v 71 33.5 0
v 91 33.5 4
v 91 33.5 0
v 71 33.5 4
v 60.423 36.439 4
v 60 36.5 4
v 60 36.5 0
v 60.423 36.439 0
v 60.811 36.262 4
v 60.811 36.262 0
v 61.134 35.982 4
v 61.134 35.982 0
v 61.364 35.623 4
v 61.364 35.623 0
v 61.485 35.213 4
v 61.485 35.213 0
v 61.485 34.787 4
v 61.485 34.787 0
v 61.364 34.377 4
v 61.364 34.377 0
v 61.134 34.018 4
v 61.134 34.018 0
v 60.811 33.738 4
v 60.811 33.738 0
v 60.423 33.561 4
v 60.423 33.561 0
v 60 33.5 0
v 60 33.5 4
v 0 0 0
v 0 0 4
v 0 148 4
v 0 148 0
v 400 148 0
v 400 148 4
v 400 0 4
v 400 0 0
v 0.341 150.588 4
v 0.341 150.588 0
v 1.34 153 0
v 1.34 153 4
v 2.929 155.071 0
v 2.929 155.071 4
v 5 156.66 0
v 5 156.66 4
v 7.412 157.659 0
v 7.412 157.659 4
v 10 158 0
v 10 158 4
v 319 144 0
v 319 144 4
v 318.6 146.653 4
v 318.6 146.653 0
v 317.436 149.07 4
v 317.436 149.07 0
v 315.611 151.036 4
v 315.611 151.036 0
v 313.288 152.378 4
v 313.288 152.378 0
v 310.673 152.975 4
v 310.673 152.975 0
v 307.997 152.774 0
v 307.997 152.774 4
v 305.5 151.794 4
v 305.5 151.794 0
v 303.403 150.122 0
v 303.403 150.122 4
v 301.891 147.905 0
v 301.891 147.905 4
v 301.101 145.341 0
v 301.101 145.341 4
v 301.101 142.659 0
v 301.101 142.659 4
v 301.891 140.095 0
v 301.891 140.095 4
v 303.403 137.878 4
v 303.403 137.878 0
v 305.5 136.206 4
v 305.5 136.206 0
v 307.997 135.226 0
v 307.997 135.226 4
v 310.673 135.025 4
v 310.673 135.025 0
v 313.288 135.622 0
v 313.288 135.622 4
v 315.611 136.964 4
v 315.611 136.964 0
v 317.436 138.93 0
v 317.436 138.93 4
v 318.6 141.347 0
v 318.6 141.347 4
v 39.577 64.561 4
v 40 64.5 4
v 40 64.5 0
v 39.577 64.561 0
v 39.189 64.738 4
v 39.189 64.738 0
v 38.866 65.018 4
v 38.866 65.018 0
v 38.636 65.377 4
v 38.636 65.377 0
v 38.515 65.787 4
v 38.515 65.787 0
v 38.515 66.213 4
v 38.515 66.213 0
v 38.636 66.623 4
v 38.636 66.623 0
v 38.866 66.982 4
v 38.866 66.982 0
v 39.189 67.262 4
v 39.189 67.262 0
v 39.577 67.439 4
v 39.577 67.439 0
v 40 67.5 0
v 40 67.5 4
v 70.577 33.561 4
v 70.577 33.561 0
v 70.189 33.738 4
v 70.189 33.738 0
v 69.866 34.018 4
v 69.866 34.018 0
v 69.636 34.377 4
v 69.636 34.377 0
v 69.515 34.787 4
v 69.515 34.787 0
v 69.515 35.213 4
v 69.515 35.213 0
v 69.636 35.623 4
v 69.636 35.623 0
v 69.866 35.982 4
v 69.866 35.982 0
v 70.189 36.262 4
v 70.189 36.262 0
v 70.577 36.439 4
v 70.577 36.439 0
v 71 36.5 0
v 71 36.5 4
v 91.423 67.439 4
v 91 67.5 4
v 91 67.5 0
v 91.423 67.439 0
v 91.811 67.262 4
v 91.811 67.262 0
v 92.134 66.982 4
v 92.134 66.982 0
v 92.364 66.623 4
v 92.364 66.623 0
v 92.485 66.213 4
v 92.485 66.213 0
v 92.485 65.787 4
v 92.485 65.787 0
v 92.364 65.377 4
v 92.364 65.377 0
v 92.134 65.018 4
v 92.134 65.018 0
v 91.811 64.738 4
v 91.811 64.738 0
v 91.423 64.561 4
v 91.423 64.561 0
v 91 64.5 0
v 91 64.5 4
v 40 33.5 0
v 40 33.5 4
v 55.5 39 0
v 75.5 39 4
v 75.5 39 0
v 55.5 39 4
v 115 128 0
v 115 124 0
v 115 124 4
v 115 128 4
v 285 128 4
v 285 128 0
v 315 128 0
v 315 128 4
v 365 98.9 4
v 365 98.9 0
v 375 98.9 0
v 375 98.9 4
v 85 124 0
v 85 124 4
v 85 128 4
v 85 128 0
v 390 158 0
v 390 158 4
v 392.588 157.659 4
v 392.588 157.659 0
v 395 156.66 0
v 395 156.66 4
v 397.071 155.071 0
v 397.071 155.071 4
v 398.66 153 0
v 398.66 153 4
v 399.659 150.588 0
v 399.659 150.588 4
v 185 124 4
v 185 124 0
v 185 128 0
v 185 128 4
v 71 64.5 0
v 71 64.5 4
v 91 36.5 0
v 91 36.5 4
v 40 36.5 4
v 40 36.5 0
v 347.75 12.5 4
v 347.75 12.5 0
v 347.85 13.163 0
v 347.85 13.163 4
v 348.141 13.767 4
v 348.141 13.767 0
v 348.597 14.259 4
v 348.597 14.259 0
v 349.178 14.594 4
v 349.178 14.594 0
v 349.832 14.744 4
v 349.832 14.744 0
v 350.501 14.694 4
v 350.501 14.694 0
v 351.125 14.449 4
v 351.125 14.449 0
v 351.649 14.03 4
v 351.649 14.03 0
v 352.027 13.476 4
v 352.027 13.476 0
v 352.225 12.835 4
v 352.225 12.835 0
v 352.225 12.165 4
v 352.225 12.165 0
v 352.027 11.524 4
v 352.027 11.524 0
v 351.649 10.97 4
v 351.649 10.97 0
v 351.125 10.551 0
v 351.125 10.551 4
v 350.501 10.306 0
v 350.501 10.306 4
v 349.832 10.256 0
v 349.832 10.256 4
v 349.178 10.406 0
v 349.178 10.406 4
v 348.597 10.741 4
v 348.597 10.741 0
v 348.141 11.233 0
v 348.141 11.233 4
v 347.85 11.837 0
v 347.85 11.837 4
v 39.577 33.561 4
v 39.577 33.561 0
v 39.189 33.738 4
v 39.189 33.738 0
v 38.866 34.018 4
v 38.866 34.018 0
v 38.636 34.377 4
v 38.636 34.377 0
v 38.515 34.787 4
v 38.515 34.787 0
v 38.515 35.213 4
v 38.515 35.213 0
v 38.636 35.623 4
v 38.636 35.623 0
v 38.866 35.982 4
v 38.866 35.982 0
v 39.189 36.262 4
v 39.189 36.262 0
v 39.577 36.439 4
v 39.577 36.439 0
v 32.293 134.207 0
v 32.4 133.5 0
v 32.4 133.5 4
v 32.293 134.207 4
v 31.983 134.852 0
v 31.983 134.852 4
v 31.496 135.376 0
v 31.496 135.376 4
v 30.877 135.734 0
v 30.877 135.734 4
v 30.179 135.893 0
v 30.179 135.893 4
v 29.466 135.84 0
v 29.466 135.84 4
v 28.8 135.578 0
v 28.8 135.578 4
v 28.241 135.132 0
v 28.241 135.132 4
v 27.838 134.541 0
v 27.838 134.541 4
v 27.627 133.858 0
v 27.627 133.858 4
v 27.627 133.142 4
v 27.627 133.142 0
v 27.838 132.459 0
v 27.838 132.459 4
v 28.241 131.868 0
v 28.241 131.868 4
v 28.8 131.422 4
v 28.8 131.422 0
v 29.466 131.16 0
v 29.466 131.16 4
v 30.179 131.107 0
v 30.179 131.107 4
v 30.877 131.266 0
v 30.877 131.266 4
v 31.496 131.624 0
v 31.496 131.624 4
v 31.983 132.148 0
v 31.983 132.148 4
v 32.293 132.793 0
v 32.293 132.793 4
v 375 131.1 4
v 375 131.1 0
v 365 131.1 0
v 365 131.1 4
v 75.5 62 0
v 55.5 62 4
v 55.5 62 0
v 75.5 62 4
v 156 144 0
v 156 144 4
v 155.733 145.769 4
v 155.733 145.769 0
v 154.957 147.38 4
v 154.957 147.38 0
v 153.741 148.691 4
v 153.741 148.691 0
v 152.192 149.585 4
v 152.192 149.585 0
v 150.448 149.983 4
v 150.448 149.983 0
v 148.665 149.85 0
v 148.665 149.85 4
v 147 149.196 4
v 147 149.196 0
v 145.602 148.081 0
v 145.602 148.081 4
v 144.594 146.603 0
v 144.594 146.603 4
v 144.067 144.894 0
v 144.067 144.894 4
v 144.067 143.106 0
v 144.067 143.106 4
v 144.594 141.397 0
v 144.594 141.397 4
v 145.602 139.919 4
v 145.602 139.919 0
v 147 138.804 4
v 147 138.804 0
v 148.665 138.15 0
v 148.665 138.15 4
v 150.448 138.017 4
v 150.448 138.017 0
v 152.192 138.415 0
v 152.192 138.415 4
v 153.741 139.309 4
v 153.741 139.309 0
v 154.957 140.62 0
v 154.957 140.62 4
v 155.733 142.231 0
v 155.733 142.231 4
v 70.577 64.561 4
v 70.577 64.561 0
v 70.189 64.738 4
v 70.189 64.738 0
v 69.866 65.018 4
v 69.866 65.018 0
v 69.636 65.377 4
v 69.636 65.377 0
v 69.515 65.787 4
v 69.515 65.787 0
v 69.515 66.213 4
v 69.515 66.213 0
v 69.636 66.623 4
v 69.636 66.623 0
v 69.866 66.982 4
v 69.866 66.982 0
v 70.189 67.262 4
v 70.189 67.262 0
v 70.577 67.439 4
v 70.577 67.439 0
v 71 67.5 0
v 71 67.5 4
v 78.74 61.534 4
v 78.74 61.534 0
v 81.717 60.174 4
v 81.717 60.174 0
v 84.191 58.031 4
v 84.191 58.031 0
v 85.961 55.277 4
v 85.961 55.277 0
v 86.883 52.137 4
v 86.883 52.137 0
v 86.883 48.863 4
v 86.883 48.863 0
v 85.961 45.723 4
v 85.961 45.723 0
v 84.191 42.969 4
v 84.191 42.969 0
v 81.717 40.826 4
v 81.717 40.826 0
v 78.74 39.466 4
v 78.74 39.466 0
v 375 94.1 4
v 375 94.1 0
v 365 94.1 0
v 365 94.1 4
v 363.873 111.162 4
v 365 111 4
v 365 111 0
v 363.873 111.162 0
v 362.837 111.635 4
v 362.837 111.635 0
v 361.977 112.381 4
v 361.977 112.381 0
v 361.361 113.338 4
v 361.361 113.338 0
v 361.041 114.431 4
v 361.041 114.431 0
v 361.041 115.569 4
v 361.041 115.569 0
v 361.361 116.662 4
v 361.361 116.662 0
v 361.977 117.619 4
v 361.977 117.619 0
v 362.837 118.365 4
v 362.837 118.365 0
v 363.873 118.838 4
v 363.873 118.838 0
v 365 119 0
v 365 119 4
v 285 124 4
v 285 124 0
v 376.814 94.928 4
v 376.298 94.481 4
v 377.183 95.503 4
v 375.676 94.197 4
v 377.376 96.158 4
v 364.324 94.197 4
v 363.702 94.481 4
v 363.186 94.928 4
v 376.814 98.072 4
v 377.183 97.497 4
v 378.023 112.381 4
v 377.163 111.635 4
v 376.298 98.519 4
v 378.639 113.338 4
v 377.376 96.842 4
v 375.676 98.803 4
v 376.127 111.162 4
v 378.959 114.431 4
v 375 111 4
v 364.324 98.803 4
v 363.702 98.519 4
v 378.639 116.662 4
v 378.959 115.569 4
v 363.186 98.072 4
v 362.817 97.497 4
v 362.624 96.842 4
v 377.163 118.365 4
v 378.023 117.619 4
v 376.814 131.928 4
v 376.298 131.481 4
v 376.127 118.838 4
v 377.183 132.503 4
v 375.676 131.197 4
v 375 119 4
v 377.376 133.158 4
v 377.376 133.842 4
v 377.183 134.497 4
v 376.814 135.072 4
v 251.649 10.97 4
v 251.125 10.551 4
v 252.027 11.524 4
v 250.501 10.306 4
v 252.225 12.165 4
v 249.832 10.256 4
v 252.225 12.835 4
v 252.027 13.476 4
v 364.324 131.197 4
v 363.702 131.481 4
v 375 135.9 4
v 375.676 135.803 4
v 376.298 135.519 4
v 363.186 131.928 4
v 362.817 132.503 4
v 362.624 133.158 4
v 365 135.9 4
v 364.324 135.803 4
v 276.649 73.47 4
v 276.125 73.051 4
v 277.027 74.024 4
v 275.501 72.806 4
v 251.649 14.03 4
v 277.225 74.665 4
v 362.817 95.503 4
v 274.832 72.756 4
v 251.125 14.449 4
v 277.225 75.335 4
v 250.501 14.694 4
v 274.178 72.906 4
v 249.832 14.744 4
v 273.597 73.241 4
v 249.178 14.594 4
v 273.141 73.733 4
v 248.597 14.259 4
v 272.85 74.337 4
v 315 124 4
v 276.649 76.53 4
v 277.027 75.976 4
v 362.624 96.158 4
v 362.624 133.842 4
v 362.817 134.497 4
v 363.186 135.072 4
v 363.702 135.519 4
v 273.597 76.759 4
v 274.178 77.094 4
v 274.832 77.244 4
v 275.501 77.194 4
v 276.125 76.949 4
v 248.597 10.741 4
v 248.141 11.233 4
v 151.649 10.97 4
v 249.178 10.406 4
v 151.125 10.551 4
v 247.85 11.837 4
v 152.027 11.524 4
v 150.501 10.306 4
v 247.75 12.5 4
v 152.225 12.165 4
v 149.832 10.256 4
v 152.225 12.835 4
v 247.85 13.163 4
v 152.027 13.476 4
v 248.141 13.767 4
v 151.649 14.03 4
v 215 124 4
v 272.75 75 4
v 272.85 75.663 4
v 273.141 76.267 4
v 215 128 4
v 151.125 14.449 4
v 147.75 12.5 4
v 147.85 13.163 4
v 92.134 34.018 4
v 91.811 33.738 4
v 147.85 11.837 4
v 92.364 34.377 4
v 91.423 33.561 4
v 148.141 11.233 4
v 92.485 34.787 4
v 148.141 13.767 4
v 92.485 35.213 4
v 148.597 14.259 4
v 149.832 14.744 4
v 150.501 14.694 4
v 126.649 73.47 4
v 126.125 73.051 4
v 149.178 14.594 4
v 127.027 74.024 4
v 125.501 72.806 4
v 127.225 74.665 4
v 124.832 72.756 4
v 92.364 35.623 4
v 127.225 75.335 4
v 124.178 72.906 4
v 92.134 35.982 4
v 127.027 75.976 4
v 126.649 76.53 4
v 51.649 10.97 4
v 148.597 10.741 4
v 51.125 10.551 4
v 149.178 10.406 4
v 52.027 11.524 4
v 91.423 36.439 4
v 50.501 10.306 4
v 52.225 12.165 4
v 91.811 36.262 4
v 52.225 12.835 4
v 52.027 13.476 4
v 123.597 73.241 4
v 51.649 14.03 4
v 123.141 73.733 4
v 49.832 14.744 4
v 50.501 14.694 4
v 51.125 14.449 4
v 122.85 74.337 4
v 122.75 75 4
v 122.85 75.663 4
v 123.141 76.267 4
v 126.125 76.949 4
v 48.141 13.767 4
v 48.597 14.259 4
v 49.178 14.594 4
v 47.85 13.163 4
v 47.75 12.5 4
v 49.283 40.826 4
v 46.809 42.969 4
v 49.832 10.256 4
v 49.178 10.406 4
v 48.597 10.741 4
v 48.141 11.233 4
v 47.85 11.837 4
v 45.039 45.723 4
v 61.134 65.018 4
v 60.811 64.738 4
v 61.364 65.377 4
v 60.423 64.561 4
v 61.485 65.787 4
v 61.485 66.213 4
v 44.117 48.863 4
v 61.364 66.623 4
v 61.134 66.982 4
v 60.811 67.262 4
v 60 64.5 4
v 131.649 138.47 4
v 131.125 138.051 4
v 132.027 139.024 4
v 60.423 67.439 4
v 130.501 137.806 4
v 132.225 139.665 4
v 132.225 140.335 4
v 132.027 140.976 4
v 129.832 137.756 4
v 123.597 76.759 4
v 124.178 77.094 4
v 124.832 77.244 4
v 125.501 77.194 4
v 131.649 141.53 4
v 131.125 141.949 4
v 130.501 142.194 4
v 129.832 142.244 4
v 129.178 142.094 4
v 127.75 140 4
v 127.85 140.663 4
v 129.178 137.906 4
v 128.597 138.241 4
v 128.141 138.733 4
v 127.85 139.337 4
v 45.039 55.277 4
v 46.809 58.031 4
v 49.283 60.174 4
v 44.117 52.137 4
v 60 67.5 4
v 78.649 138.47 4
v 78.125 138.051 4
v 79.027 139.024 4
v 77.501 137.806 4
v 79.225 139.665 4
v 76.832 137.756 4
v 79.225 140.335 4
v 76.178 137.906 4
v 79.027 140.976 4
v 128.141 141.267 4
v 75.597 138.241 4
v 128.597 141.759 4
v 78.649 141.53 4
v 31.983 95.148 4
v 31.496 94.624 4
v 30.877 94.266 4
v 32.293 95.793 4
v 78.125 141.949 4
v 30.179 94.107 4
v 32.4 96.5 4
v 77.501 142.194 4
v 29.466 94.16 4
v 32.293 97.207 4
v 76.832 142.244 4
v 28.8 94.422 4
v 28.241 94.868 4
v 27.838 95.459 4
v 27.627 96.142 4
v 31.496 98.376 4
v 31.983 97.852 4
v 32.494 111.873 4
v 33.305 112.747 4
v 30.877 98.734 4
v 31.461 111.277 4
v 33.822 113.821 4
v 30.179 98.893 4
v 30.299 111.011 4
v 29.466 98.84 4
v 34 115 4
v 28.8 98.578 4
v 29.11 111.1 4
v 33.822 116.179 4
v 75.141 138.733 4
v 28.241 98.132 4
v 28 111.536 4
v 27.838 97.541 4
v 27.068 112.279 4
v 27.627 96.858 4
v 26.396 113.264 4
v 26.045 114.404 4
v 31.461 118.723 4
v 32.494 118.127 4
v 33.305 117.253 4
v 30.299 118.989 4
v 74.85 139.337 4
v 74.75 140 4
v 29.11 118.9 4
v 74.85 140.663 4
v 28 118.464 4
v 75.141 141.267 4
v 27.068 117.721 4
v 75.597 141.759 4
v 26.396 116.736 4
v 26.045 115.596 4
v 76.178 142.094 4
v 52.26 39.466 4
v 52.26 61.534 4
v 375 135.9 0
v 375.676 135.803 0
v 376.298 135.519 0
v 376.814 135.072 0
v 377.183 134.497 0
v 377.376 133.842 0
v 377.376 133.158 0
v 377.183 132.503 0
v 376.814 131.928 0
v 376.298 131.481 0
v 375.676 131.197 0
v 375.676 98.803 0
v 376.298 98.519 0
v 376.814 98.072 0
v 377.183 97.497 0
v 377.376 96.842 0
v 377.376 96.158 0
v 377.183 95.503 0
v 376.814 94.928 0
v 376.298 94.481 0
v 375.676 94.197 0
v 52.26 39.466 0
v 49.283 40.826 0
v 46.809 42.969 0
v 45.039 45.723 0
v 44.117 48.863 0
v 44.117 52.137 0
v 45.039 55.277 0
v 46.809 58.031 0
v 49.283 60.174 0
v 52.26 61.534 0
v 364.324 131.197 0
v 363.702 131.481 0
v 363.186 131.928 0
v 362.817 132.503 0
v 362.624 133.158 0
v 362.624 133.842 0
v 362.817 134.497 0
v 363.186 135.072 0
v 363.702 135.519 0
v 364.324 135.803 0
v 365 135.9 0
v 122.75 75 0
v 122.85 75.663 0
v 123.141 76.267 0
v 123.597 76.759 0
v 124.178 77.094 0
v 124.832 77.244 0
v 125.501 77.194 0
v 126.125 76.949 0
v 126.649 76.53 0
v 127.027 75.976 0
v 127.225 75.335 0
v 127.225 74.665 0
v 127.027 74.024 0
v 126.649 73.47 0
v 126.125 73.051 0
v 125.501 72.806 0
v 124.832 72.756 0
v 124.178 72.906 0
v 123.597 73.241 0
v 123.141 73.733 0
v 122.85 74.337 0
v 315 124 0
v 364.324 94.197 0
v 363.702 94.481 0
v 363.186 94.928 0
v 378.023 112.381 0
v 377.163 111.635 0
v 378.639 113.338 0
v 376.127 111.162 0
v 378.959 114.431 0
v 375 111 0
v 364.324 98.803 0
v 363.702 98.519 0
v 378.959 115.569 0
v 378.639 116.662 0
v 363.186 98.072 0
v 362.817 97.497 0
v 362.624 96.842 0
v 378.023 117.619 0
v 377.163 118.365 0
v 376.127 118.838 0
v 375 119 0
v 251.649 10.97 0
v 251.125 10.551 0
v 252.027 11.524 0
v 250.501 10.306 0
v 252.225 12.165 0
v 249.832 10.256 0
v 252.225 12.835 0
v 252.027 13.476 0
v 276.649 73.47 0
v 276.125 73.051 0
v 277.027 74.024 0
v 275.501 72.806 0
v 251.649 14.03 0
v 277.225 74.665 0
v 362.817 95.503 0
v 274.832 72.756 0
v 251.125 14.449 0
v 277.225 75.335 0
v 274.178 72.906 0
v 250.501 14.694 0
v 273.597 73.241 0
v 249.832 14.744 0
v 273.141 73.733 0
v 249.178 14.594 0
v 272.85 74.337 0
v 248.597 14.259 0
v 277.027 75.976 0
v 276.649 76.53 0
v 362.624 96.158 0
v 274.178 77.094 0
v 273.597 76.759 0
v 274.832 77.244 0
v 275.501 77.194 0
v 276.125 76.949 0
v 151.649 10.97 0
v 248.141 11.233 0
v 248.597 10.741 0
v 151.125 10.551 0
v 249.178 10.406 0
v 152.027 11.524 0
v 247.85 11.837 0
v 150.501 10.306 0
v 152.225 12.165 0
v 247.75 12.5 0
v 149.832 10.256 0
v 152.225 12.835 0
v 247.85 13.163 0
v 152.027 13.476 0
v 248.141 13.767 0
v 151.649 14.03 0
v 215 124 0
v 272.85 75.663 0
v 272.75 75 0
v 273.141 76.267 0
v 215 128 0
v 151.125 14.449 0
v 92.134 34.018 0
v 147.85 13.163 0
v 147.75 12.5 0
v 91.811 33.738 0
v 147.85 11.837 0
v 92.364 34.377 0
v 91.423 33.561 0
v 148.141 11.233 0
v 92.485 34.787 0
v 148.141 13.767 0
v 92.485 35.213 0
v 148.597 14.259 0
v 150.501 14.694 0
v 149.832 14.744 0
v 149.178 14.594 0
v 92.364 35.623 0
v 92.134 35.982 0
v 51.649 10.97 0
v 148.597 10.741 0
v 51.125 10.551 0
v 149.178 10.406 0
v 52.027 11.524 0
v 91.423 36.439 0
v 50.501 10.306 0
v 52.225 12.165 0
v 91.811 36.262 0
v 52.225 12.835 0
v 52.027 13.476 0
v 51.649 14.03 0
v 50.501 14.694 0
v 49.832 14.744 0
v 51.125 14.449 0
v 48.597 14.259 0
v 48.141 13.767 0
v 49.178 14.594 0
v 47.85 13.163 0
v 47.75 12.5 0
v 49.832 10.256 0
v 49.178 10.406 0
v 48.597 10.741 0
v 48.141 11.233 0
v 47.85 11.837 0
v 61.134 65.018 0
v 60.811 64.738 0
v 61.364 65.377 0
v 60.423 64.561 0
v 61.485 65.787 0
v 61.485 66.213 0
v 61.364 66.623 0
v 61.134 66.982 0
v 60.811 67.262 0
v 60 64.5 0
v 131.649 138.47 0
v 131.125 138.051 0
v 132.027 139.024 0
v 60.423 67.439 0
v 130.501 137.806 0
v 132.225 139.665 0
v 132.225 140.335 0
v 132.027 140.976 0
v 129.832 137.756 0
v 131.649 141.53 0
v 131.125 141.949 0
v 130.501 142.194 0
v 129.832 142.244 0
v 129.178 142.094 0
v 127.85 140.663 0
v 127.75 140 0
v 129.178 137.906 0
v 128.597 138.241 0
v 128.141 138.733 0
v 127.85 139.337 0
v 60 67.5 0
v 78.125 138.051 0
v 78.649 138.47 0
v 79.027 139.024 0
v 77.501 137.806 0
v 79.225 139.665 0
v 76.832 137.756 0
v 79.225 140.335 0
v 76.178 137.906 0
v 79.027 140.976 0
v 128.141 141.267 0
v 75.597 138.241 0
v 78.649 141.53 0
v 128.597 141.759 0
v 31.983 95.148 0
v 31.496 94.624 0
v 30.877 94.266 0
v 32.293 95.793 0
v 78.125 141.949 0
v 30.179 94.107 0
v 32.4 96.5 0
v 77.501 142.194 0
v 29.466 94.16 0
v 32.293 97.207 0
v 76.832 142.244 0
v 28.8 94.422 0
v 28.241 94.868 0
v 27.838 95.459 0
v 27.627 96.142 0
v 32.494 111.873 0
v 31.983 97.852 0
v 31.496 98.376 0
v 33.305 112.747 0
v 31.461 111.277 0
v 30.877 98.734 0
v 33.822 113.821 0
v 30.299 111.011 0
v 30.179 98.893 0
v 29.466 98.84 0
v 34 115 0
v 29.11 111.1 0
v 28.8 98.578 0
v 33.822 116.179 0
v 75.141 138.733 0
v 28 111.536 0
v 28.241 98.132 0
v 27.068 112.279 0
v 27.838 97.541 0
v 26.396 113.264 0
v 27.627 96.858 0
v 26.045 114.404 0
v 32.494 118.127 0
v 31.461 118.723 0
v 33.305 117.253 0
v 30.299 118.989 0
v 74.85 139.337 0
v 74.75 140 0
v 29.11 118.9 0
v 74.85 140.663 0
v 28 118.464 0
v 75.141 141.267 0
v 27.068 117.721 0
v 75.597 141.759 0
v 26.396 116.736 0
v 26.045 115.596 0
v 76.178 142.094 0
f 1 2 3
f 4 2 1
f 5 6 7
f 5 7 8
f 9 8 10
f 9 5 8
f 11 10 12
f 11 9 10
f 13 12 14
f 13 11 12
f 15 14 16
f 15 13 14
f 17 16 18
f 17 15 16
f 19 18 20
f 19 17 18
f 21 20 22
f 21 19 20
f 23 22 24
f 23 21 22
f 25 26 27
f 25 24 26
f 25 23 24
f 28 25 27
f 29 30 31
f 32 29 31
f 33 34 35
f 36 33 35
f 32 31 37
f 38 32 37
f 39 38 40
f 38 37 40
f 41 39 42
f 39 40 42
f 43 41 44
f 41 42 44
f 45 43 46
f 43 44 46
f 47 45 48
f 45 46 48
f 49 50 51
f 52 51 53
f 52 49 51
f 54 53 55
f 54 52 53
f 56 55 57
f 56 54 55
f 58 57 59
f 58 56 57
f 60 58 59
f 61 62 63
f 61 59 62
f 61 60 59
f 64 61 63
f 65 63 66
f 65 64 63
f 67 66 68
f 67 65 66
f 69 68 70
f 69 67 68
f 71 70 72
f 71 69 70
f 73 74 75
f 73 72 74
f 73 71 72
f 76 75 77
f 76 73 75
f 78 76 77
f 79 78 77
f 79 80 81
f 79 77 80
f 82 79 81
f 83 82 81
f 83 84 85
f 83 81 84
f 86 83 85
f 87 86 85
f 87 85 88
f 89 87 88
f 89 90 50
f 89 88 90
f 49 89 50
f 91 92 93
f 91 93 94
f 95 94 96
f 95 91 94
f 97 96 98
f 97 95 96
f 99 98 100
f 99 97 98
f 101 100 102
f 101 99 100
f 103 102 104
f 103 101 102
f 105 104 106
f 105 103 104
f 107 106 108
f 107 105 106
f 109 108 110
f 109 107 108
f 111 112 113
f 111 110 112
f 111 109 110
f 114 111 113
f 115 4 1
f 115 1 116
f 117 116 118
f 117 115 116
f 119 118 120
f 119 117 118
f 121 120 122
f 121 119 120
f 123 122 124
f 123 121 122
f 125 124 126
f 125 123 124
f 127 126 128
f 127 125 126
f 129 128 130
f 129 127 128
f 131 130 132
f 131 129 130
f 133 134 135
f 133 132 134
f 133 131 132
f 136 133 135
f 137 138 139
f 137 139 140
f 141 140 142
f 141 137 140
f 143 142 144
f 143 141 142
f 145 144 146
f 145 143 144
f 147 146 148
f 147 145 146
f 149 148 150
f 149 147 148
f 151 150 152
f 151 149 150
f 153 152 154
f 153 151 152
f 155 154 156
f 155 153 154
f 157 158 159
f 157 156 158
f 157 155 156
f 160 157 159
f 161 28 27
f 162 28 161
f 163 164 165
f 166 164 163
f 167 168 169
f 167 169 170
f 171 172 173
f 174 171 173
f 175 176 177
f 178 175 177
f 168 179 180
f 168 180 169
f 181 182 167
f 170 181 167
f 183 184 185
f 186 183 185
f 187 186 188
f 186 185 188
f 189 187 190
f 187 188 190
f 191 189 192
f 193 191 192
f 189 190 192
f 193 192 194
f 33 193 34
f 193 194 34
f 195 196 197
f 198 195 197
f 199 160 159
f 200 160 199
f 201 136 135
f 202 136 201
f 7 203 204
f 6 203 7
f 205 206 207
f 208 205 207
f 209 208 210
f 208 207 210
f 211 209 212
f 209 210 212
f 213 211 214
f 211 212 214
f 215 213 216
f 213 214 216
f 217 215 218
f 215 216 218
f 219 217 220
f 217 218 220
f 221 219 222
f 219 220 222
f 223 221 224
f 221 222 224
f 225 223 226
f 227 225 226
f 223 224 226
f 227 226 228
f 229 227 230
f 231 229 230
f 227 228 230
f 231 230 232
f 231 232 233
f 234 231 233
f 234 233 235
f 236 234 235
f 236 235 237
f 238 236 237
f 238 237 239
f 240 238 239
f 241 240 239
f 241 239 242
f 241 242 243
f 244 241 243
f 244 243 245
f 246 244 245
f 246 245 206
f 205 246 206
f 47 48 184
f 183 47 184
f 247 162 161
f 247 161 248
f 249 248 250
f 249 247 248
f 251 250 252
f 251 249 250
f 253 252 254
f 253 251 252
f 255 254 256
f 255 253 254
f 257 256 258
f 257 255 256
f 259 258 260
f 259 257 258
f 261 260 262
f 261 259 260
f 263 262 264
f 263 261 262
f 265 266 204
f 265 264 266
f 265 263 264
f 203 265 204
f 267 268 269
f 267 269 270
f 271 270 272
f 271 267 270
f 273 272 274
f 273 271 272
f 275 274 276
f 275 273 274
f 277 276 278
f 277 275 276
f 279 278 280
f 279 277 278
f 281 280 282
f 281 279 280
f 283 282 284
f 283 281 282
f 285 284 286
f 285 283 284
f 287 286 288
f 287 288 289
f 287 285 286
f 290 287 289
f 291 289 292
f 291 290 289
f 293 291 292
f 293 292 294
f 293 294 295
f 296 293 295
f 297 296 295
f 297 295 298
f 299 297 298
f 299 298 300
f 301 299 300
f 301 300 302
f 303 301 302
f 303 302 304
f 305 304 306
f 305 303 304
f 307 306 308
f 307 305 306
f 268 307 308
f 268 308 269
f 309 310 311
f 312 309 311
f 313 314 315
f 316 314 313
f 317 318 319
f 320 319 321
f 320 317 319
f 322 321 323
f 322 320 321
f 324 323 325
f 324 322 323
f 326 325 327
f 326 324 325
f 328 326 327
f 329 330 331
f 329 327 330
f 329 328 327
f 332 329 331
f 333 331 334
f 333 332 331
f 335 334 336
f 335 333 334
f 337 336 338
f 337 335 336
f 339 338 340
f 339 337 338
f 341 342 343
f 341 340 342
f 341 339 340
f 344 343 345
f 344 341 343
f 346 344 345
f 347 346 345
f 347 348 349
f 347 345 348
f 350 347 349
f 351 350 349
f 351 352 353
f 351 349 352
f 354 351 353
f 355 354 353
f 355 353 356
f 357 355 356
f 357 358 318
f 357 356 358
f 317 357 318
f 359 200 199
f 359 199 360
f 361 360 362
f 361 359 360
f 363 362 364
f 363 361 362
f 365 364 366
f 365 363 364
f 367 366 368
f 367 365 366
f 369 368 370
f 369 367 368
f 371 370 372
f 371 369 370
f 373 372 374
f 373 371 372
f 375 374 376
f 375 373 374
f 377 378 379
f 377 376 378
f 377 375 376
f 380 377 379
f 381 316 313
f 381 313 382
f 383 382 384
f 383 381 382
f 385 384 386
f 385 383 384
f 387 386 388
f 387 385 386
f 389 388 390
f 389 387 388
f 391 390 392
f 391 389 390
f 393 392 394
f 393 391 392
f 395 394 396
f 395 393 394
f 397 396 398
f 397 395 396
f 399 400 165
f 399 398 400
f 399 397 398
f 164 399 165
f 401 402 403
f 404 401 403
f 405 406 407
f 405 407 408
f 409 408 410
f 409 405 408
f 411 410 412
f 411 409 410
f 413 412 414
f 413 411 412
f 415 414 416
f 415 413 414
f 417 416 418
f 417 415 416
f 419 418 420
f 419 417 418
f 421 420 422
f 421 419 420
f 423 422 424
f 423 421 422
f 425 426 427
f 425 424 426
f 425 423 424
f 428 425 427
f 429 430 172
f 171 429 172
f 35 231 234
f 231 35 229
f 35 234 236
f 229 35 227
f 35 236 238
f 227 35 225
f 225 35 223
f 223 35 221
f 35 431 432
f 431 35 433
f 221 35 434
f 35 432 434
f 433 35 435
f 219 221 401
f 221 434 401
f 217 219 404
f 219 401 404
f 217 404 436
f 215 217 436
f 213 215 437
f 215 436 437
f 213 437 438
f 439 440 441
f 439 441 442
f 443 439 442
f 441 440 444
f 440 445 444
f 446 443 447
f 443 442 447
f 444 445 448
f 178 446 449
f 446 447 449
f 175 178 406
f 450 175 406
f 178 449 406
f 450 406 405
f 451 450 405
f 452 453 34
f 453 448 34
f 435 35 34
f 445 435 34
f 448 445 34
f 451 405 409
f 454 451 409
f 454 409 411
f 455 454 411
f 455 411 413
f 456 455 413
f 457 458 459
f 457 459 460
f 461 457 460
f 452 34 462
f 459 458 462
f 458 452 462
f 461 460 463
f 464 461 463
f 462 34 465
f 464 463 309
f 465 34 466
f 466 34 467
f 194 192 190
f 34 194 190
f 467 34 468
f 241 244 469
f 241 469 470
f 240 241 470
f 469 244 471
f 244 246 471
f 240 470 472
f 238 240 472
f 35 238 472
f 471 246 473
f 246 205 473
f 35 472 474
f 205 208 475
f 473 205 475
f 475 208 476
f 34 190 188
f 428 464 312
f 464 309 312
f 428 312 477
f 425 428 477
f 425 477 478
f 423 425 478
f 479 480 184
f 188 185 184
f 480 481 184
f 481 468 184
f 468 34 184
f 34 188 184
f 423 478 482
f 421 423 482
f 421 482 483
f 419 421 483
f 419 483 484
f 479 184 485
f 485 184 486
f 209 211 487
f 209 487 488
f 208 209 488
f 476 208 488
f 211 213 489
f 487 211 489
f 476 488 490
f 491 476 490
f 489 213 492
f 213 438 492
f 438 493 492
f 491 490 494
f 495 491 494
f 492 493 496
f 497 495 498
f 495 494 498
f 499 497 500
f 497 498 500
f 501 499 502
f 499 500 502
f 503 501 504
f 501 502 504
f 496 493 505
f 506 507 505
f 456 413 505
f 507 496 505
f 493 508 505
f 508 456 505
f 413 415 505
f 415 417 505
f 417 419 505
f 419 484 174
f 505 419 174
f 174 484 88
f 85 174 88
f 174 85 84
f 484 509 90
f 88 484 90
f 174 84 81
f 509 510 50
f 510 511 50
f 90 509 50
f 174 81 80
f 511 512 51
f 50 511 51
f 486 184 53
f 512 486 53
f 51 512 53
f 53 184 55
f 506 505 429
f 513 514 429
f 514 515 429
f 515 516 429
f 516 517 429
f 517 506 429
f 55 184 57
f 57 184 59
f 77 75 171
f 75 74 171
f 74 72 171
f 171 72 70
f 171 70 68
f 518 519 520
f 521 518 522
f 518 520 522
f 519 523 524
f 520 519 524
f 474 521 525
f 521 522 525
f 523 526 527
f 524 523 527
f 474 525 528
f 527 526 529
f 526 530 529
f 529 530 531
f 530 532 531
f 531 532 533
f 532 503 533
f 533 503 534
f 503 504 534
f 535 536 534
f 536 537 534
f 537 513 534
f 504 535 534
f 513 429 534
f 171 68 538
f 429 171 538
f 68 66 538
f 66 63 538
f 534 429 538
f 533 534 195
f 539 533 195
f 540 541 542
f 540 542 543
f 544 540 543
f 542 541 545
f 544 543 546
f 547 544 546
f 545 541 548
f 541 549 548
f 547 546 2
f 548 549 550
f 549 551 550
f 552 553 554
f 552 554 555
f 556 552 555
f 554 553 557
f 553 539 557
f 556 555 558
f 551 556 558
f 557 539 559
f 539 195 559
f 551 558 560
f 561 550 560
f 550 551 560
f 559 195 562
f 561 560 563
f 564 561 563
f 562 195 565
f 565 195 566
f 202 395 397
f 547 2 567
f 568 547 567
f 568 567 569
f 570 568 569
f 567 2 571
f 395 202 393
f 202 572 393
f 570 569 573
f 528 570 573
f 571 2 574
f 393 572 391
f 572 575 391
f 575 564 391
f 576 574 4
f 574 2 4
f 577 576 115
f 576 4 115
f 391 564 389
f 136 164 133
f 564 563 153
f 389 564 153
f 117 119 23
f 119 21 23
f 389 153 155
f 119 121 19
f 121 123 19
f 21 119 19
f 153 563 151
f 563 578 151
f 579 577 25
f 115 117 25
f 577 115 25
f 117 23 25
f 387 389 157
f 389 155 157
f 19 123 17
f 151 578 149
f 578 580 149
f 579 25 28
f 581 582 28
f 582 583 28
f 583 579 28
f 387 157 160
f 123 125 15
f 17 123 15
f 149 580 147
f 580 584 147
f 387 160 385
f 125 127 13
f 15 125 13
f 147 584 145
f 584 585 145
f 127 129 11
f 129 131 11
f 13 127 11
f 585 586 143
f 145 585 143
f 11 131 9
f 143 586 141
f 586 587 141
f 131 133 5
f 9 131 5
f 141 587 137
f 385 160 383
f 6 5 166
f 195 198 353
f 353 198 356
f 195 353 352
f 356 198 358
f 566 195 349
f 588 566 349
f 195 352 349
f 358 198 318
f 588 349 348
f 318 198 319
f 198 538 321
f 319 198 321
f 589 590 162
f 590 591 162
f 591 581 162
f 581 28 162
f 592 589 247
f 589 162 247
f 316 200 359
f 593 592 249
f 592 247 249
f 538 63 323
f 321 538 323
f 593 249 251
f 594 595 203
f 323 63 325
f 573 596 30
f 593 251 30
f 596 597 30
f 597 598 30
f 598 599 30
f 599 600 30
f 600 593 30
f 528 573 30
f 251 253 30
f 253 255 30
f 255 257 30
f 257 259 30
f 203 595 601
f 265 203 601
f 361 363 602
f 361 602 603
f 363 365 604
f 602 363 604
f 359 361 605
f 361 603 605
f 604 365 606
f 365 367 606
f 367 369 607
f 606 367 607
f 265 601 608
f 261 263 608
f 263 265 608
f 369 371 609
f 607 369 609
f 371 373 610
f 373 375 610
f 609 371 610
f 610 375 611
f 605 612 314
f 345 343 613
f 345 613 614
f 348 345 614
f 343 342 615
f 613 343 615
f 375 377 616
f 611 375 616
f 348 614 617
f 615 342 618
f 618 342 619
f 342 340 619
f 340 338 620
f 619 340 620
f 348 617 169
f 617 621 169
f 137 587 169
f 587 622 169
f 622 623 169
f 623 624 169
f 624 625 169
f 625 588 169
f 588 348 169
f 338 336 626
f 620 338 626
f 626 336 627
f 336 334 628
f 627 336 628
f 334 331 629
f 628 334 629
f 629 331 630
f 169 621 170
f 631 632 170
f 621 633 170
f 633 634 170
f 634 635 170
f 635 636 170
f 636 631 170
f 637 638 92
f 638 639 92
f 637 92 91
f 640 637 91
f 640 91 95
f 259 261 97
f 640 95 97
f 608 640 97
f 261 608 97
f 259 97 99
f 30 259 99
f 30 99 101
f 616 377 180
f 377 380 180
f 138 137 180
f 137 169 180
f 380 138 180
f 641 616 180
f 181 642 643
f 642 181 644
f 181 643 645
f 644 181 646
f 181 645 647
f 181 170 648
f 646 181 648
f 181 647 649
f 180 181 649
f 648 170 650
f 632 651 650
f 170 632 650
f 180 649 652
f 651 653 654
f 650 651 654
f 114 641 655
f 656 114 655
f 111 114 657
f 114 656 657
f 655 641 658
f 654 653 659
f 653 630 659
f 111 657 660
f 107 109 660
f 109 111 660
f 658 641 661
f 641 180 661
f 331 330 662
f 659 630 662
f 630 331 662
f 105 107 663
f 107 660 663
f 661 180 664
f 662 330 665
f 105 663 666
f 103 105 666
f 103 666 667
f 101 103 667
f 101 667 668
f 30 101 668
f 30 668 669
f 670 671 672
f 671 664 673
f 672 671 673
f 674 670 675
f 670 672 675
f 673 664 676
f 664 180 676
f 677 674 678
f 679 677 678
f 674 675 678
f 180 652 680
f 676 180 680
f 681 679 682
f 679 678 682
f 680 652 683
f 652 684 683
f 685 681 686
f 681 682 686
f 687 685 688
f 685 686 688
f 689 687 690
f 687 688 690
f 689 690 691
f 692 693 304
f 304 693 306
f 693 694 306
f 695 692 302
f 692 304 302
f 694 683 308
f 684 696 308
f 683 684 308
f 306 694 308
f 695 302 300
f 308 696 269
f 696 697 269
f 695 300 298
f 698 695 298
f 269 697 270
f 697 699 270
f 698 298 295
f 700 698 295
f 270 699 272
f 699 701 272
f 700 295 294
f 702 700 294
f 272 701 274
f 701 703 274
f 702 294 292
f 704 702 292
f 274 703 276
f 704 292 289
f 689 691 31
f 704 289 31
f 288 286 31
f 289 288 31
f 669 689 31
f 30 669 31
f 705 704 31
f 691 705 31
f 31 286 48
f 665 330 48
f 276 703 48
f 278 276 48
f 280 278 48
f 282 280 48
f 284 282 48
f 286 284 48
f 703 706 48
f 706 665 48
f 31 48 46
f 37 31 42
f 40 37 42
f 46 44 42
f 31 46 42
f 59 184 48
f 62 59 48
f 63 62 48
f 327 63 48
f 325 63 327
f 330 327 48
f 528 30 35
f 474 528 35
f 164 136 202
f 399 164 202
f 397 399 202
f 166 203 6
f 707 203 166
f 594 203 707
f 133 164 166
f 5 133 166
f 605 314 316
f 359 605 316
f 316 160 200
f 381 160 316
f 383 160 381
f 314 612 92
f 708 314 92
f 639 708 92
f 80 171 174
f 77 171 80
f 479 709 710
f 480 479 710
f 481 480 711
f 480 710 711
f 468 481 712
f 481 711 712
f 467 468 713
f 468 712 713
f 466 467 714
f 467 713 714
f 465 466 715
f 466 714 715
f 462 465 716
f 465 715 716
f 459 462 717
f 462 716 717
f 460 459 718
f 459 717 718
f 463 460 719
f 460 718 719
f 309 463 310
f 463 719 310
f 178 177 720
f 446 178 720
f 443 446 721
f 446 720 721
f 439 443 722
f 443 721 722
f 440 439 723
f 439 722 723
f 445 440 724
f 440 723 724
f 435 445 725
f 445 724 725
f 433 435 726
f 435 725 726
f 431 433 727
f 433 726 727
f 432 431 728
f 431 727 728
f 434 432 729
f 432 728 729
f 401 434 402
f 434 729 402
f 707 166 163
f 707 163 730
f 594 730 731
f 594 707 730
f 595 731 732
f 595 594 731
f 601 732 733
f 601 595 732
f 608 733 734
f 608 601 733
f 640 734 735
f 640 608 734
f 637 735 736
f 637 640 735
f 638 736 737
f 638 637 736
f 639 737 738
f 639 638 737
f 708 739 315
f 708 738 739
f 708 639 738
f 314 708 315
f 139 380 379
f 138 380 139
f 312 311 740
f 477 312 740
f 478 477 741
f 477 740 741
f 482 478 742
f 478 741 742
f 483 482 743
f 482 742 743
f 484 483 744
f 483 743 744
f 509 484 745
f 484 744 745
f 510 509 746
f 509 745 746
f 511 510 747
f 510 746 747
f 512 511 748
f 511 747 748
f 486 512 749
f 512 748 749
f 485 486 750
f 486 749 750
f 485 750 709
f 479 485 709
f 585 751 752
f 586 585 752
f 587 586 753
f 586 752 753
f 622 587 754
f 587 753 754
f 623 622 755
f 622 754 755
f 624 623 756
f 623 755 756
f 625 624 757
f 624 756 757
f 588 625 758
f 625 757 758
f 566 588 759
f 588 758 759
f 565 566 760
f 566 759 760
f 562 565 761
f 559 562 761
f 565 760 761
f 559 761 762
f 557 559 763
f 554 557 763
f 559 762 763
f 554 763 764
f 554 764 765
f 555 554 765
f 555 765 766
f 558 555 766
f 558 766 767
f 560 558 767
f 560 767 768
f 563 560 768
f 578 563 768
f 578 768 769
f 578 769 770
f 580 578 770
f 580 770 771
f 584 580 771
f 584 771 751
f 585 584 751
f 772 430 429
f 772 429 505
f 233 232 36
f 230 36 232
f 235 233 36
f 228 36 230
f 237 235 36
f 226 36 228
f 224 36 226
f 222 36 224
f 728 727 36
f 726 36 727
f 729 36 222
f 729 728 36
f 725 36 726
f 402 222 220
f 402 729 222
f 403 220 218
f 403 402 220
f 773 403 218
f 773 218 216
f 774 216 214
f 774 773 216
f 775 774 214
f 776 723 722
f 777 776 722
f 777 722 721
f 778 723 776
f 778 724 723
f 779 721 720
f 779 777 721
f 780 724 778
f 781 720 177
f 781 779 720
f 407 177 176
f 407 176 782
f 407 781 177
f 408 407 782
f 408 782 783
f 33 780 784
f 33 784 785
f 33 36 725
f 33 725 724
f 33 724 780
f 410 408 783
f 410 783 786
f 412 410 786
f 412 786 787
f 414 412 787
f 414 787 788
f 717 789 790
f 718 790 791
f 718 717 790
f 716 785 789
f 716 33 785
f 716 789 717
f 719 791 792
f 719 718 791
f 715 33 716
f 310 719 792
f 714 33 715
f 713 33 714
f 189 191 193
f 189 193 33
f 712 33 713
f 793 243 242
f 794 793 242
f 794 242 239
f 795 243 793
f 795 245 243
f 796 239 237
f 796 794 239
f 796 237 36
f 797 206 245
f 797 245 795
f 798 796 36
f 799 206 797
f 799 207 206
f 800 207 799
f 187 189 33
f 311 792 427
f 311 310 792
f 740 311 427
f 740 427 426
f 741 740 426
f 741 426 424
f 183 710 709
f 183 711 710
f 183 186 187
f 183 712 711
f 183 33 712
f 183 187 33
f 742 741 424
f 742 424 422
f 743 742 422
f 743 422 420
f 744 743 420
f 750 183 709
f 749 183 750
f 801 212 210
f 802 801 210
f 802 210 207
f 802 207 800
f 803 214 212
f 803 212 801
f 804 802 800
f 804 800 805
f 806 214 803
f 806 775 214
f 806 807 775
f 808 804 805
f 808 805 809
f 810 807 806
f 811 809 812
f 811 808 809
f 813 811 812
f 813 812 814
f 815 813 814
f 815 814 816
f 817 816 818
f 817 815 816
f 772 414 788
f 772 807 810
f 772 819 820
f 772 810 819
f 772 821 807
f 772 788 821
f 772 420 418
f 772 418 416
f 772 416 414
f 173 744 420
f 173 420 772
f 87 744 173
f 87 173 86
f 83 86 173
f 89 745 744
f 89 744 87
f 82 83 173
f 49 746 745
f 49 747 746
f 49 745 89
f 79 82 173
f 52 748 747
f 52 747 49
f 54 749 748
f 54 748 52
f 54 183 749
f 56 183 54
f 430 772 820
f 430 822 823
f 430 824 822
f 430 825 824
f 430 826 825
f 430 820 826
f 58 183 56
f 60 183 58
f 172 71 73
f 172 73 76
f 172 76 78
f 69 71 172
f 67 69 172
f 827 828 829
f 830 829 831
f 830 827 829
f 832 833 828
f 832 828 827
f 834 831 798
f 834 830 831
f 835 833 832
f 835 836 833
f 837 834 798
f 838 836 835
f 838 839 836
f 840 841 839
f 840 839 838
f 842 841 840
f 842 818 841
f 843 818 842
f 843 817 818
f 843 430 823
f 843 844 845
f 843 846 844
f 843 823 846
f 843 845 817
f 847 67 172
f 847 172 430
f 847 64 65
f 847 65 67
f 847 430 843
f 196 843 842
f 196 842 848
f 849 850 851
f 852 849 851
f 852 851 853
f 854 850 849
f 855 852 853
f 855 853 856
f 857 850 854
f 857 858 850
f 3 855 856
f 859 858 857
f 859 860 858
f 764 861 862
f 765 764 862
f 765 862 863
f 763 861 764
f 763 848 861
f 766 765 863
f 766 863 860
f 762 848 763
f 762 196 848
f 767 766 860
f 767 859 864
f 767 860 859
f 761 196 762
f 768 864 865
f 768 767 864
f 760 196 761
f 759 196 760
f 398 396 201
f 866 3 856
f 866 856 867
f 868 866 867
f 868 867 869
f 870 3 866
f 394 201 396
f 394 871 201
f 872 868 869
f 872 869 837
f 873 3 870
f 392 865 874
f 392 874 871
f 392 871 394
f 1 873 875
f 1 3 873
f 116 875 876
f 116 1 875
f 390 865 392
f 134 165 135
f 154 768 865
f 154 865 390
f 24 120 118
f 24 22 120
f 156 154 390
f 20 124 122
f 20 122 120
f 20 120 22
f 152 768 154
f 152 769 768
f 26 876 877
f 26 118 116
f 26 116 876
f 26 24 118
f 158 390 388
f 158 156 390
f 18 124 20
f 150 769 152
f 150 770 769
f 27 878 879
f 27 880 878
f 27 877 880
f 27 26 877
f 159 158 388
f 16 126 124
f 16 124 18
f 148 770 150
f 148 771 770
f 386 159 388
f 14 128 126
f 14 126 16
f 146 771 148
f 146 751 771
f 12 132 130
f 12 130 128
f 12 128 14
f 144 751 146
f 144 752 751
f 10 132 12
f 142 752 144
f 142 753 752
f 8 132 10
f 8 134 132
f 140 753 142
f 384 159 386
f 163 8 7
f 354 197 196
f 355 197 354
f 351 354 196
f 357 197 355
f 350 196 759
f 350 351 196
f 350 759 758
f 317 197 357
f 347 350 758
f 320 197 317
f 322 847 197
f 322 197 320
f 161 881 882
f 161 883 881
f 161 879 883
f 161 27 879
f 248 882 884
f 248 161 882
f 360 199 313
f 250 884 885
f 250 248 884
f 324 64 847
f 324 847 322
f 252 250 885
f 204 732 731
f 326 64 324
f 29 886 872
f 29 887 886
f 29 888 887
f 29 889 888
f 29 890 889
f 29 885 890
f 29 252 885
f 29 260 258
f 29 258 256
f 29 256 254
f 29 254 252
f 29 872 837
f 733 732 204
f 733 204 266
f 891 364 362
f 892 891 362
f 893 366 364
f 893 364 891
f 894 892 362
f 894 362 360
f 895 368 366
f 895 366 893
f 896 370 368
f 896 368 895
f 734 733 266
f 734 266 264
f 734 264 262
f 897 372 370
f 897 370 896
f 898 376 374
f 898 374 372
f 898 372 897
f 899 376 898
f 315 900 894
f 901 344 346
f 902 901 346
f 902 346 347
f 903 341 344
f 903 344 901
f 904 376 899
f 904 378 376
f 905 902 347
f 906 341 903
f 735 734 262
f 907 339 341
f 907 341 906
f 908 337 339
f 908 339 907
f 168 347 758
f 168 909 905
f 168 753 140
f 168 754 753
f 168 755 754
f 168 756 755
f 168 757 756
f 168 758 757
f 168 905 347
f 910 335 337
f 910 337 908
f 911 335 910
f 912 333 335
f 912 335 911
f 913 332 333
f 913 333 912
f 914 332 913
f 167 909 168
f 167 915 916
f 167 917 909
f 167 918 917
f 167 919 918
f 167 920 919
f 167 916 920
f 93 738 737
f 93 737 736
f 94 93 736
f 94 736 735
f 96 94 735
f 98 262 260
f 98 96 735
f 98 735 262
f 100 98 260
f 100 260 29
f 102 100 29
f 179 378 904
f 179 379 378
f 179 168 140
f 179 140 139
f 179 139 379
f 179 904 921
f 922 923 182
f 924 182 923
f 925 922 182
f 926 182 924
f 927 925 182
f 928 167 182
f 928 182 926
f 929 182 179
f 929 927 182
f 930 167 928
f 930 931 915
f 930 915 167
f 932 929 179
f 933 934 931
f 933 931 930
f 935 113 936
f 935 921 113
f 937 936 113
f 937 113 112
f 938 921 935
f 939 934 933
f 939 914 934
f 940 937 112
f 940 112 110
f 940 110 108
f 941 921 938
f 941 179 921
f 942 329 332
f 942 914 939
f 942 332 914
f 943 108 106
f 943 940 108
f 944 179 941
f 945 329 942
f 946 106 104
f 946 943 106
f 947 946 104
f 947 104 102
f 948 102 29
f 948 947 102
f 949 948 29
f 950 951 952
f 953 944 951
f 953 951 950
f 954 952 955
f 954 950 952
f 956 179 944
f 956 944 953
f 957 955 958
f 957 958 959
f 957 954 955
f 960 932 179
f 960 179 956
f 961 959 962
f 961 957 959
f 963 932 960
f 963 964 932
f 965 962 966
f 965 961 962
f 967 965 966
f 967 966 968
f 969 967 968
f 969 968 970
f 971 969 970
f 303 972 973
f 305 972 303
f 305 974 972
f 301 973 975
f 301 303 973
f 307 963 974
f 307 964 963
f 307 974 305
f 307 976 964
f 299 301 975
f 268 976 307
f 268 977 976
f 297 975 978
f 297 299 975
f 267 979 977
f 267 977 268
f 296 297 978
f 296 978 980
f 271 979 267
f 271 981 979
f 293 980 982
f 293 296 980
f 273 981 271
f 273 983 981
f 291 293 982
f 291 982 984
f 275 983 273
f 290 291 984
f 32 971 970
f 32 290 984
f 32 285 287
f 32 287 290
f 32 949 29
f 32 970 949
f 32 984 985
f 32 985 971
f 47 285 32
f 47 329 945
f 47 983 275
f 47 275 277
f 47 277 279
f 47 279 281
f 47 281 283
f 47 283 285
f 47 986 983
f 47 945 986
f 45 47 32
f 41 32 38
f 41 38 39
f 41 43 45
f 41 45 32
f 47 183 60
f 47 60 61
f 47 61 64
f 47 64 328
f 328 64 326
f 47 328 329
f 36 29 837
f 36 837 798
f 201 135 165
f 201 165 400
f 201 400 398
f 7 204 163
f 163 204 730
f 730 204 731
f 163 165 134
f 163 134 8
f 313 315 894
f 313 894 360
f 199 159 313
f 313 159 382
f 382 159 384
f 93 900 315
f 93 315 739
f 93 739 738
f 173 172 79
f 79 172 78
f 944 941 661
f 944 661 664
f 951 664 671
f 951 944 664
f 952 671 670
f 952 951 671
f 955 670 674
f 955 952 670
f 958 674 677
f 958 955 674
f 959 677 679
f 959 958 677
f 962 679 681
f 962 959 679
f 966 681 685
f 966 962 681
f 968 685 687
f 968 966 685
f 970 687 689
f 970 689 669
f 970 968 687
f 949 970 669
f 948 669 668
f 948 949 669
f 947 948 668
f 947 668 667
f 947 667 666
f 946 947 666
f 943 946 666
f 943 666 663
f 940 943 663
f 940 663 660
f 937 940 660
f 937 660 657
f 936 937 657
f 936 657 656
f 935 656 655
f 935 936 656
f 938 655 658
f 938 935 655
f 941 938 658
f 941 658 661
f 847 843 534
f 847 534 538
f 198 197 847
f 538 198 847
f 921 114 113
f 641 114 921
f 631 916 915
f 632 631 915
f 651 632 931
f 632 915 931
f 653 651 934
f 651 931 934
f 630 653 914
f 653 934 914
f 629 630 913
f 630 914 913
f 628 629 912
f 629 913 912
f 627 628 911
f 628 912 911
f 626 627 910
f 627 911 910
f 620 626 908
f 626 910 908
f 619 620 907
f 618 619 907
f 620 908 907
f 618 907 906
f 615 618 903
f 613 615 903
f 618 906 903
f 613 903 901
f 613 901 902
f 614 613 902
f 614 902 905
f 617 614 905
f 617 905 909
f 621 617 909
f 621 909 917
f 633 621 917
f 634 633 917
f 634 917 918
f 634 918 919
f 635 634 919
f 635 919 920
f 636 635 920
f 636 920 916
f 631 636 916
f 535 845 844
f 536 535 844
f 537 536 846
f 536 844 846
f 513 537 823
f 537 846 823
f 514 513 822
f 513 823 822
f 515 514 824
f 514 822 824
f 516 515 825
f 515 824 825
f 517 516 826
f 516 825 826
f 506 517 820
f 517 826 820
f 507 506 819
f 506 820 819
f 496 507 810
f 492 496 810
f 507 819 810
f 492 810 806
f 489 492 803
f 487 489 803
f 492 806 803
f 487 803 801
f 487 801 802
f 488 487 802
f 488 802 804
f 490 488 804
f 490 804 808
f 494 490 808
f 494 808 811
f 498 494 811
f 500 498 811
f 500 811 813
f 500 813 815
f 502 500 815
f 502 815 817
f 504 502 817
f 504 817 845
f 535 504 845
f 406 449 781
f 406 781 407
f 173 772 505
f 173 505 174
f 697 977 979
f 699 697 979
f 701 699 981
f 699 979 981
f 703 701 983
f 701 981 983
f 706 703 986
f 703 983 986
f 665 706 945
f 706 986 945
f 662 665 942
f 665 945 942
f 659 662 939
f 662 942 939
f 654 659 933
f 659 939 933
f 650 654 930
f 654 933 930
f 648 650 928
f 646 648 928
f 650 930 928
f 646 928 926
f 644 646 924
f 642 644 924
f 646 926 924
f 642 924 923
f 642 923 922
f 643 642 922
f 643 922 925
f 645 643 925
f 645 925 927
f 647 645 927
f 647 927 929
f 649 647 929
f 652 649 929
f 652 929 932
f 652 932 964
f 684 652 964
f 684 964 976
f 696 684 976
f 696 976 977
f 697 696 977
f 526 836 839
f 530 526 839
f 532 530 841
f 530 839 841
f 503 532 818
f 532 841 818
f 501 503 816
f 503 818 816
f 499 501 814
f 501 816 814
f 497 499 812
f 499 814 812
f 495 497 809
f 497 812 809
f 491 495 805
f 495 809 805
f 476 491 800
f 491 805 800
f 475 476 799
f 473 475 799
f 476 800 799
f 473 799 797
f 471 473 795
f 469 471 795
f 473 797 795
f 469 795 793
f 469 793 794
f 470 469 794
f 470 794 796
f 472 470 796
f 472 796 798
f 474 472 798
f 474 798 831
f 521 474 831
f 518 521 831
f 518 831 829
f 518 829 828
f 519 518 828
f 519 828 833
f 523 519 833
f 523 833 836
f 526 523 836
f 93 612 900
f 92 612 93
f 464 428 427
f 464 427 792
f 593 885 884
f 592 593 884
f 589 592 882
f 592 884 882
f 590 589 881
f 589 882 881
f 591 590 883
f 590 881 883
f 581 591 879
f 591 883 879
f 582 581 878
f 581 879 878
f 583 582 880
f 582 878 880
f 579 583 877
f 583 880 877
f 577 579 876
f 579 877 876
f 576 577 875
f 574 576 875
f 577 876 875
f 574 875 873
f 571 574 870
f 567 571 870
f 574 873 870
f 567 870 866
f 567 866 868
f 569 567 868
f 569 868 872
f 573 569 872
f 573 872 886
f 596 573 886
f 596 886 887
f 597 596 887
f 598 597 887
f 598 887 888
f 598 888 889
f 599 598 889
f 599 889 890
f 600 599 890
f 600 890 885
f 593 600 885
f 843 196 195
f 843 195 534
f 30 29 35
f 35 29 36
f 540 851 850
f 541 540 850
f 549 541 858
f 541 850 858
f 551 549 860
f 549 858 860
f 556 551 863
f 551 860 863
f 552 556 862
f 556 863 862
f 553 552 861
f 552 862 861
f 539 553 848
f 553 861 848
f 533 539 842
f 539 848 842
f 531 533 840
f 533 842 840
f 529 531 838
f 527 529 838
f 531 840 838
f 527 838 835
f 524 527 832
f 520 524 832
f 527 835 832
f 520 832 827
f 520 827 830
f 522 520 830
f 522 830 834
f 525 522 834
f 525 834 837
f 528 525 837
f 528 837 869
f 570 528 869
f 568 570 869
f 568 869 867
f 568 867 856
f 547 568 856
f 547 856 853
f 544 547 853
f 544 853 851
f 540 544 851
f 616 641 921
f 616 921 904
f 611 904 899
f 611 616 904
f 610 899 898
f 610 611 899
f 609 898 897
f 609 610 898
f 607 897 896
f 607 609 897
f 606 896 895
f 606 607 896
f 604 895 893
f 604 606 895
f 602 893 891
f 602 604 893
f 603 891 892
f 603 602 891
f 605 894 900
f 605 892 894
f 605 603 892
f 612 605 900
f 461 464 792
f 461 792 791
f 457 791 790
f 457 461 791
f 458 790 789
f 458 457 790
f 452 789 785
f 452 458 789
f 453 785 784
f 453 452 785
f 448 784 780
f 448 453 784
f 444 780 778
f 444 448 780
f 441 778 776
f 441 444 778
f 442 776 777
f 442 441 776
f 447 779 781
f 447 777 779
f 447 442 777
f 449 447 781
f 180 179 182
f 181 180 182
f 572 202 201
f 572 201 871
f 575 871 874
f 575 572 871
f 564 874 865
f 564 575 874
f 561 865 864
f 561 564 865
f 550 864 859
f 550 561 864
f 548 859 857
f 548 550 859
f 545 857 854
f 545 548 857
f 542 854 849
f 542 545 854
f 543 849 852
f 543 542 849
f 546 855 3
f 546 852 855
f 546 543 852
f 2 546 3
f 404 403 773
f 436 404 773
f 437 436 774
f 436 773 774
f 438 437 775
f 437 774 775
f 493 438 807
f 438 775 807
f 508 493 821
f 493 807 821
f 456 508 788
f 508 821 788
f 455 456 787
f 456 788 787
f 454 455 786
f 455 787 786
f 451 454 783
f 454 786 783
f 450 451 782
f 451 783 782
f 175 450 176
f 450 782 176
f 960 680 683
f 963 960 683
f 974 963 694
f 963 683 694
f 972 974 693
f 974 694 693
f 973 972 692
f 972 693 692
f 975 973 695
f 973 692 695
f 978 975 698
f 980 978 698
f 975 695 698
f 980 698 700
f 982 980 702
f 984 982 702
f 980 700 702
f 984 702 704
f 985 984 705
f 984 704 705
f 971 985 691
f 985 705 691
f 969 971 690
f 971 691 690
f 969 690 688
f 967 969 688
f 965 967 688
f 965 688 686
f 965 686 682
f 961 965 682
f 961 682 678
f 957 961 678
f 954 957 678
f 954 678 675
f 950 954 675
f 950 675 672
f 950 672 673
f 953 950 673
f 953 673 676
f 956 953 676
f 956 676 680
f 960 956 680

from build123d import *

# Parameters (mm, degrees)
ESBO_O1_R                = 2.4
ESBO_O1_W                = 30
ESBO_O1_H                = 4
RESSALTO_EXTRUS_O1_DEPTH = 4
ESBO_O3_R                = 4
CORTE_EXTRUS_O1_DEPTH    = 6
FURO_COM_FOLGA_DE_M41_D  = 4.5
RESSALTO_EXTRUS_O2_DEPTH = 4
ESBO_O8_R                = 6
ESBO_O8_R_2              = 9
CORTE_EXTRUS_O4_DEPTH    = 5


with BuildPart() as part:
    # Esboço1 → Ressalto-extrusão1 (new body)
    with BuildSketch(Plane.XY):
        with BuildLine():
            Line((120, 130), (120, 140))
            ThreePointArc((120, 140), (122.928932188, 147.071067812), (130, 150))
            Line((130, 150), (50, 150))
            ThreePointArc((50, 150), (57.071067812, 147.071067812), (60, 140))
            Line((60, 140), (60, 130))
            Line((60, 130), (120, 130))
        make_face()
        with BuildLine():
            Line((0, 140), (0, 0))
            Line((0, 0), (400, 0))
            Line((400, 0), (400, 140))
            ThreePointArc((400, 140), (397.071067812, 147.071067812), (390, 150))
            Line((390, 150), (319, 150))
            Line((319, 150), (301, 150))
            Line((301, 150), (130, 150))
            ThreePointArc((130, 150), (122.928932188, 147.071067812), (120, 140))
            Line((120, 140), (120, 130))
            Line((120, 130), (60, 130))
            Line((60, 130), (60, 140))
            ThreePointArc((60, 140), (57.071067812, 147.071067812), (50, 150))
            Line((50, 150), (10, 150))
            ThreePointArc((10, 150), (2.928932188, 147.071067812), (0, 140))
        make_face()
        with Locations((30, 96.5)):
            Circle(ESBO_O1_R, mode=Mode.SUBTRACT)
        with Locations((30, 133.5)):
            Circle(ESBO_O1_R, mode=Mode.SUBTRACT)
        with Locations((100, 126)):
            Rectangle(ESBO_O1_W, ESBO_O1_H, mode=Mode.SUBTRACT)
        with BuildLine():
            ThreePointArc((365, 94.1), (362.6, 96.5), (365, 98.9))
            Line((365, 98.9), (375, 98.9))
            ThreePointArc((375, 98.9), (377.4, 96.5), (375, 94.1))
            Line((375, 94.1), (365, 94.1))
        make_face(mode=Mode.SUBTRACT)
        with Locations((200, 126)):
            Rectangle(ESBO_O1_W, ESBO_O1_H, mode=Mode.SUBTRACT)
        with Locations((300, 126)):
            Rectangle(ESBO_O1_W, ESBO_O1_H, mode=Mode.SUBTRACT)
        with BuildLine():
            ThreePointArc((365, 131.1), (362.6, 133.5), (365, 135.9))
            Line((365, 135.9), (375, 135.9))
            ThreePointArc((375, 135.9), (377.4, 133.5), (375, 131.1))
            Line((375, 131.1), (365, 131.1))
        make_face(mode=Mode.SUBTRACT)
    extrude(amount=RESSALTO_EXTRUS_O1_DEPTH)

    # Esboço3 → Corte-extrusão1 (cut)
    with BuildSketch(Plane.XY.offset(4)):
        with Locations((30, 115)):
            Circle(ESBO_O3_R)
        with BuildLine():
            Line((365, 119), (375, 119))
            ThreePointArc((375, 119), (379, 115), (375, 111))
            Line((375, 111), (365, 111))
            ThreePointArc((365, 111), (361, 115), (365, 119))
        make_face()
        with BuildLine():
            Line((40, 67.5), (60, 67.5))
            ThreePointArc((60, 67.5), (61.5, 66), (60, 64.5))
            Line((60, 64.5), (40, 64.5))
            ThreePointArc((40, 64.5), (38.5, 66), (40, 67.5))
        make_face()
        with BuildLine():
            Line((71, 36.5), (91, 36.5))
            ThreePointArc((91, 36.5), (92.5, 35), (91, 33.5))
            Line((91, 33.5), (71, 33.5))
            ThreePointArc((71, 33.5), (69.5, 35), (71, 36.5))
        make_face()
        with BuildLine():
            Line((71, 67.5), (91, 67.5))
            ThreePointArc((91, 67.5), (92.5, 66), (91, 64.5))
            Line((91, 64.5), (71, 64.5))
            ThreePointArc((71, 64.5), (69.5, 66), (71, 67.5))
        make_face()
        with BuildLine():
            Line((40, 36.5), (60, 36.5))
            ThreePointArc((60, 36.5), (61.5, 35), (60, 33.5))
            Line((60, 33.5), (40, 33.5))
            ThreePointArc((40, 33.5), (38.5, 35), (40, 36.5))
        make_face()
        with BuildLine():
            Line((55.5, 62), (75.5, 62))
            ThreePointArc((75.5, 62), (87, 50.5), (75.5, 39))
            Line((75.5, 39), (55.5, 39))
            ThreePointArc((55.5, 39), (44, 50.5), (55.5, 62))
        make_face()
    extrude(amount=-CORTE_EXTRUS_O1_DEPTH, mode=Mode.SUBTRACT)

    # Furo com folga de M41 (through all)
    with Locations(Plane(origin=(50, 12.5, 4), x_dir=(1, 0, 0), z_dir=(0, 0, 1))):
        with Locations((0, 0), (100, 0), (200, 0), (300, 0), (225, 62.5), (75, 62.5), (27, 127.5), (80, 127.5)):
            Hole(FURO_COM_FOLGA_DE_M41_D / 2)

    # Esboço5 → Ressalto-extrusão2 (add)
    with BuildSketch(Plane.XY.offset(4)):
        with BuildLine():
            Line((0, 140), (0, 148))
            ThreePointArc((0, 148), (2.928932188, 155.071067812), (10, 158))
            Line((10, 158), (390, 158))
            ThreePointArc((390, 158), (397.071067812, 155.071067812), (400, 148))
            Line((400, 148), (400, 140))
            ThreePointArc((400, 140), (397.071067812, 147.071067812), (390, 150))
            Line((390, 150), (10, 150))
            ThreePointArc((10, 150), (2.928932188, 147.071067812), (0, 140))
        make_face()
    extrude(amount=-RESSALTO_EXTRUS_O2_DEPTH)

    # Esboço8 → Corte-extrusão4 (cut, through all)
    with BuildSketch(Plane.XY):
        with Locations((150, 144)):
            Circle(ESBO_O8_R)
        with Locations((310, 144)):
            Circle(ESBO_O8_R_2)
    extrude(amount=CORTE_EXTRUS_O4_DEPTH, mode=Mode.SUBTRACT)


solid = part.part
